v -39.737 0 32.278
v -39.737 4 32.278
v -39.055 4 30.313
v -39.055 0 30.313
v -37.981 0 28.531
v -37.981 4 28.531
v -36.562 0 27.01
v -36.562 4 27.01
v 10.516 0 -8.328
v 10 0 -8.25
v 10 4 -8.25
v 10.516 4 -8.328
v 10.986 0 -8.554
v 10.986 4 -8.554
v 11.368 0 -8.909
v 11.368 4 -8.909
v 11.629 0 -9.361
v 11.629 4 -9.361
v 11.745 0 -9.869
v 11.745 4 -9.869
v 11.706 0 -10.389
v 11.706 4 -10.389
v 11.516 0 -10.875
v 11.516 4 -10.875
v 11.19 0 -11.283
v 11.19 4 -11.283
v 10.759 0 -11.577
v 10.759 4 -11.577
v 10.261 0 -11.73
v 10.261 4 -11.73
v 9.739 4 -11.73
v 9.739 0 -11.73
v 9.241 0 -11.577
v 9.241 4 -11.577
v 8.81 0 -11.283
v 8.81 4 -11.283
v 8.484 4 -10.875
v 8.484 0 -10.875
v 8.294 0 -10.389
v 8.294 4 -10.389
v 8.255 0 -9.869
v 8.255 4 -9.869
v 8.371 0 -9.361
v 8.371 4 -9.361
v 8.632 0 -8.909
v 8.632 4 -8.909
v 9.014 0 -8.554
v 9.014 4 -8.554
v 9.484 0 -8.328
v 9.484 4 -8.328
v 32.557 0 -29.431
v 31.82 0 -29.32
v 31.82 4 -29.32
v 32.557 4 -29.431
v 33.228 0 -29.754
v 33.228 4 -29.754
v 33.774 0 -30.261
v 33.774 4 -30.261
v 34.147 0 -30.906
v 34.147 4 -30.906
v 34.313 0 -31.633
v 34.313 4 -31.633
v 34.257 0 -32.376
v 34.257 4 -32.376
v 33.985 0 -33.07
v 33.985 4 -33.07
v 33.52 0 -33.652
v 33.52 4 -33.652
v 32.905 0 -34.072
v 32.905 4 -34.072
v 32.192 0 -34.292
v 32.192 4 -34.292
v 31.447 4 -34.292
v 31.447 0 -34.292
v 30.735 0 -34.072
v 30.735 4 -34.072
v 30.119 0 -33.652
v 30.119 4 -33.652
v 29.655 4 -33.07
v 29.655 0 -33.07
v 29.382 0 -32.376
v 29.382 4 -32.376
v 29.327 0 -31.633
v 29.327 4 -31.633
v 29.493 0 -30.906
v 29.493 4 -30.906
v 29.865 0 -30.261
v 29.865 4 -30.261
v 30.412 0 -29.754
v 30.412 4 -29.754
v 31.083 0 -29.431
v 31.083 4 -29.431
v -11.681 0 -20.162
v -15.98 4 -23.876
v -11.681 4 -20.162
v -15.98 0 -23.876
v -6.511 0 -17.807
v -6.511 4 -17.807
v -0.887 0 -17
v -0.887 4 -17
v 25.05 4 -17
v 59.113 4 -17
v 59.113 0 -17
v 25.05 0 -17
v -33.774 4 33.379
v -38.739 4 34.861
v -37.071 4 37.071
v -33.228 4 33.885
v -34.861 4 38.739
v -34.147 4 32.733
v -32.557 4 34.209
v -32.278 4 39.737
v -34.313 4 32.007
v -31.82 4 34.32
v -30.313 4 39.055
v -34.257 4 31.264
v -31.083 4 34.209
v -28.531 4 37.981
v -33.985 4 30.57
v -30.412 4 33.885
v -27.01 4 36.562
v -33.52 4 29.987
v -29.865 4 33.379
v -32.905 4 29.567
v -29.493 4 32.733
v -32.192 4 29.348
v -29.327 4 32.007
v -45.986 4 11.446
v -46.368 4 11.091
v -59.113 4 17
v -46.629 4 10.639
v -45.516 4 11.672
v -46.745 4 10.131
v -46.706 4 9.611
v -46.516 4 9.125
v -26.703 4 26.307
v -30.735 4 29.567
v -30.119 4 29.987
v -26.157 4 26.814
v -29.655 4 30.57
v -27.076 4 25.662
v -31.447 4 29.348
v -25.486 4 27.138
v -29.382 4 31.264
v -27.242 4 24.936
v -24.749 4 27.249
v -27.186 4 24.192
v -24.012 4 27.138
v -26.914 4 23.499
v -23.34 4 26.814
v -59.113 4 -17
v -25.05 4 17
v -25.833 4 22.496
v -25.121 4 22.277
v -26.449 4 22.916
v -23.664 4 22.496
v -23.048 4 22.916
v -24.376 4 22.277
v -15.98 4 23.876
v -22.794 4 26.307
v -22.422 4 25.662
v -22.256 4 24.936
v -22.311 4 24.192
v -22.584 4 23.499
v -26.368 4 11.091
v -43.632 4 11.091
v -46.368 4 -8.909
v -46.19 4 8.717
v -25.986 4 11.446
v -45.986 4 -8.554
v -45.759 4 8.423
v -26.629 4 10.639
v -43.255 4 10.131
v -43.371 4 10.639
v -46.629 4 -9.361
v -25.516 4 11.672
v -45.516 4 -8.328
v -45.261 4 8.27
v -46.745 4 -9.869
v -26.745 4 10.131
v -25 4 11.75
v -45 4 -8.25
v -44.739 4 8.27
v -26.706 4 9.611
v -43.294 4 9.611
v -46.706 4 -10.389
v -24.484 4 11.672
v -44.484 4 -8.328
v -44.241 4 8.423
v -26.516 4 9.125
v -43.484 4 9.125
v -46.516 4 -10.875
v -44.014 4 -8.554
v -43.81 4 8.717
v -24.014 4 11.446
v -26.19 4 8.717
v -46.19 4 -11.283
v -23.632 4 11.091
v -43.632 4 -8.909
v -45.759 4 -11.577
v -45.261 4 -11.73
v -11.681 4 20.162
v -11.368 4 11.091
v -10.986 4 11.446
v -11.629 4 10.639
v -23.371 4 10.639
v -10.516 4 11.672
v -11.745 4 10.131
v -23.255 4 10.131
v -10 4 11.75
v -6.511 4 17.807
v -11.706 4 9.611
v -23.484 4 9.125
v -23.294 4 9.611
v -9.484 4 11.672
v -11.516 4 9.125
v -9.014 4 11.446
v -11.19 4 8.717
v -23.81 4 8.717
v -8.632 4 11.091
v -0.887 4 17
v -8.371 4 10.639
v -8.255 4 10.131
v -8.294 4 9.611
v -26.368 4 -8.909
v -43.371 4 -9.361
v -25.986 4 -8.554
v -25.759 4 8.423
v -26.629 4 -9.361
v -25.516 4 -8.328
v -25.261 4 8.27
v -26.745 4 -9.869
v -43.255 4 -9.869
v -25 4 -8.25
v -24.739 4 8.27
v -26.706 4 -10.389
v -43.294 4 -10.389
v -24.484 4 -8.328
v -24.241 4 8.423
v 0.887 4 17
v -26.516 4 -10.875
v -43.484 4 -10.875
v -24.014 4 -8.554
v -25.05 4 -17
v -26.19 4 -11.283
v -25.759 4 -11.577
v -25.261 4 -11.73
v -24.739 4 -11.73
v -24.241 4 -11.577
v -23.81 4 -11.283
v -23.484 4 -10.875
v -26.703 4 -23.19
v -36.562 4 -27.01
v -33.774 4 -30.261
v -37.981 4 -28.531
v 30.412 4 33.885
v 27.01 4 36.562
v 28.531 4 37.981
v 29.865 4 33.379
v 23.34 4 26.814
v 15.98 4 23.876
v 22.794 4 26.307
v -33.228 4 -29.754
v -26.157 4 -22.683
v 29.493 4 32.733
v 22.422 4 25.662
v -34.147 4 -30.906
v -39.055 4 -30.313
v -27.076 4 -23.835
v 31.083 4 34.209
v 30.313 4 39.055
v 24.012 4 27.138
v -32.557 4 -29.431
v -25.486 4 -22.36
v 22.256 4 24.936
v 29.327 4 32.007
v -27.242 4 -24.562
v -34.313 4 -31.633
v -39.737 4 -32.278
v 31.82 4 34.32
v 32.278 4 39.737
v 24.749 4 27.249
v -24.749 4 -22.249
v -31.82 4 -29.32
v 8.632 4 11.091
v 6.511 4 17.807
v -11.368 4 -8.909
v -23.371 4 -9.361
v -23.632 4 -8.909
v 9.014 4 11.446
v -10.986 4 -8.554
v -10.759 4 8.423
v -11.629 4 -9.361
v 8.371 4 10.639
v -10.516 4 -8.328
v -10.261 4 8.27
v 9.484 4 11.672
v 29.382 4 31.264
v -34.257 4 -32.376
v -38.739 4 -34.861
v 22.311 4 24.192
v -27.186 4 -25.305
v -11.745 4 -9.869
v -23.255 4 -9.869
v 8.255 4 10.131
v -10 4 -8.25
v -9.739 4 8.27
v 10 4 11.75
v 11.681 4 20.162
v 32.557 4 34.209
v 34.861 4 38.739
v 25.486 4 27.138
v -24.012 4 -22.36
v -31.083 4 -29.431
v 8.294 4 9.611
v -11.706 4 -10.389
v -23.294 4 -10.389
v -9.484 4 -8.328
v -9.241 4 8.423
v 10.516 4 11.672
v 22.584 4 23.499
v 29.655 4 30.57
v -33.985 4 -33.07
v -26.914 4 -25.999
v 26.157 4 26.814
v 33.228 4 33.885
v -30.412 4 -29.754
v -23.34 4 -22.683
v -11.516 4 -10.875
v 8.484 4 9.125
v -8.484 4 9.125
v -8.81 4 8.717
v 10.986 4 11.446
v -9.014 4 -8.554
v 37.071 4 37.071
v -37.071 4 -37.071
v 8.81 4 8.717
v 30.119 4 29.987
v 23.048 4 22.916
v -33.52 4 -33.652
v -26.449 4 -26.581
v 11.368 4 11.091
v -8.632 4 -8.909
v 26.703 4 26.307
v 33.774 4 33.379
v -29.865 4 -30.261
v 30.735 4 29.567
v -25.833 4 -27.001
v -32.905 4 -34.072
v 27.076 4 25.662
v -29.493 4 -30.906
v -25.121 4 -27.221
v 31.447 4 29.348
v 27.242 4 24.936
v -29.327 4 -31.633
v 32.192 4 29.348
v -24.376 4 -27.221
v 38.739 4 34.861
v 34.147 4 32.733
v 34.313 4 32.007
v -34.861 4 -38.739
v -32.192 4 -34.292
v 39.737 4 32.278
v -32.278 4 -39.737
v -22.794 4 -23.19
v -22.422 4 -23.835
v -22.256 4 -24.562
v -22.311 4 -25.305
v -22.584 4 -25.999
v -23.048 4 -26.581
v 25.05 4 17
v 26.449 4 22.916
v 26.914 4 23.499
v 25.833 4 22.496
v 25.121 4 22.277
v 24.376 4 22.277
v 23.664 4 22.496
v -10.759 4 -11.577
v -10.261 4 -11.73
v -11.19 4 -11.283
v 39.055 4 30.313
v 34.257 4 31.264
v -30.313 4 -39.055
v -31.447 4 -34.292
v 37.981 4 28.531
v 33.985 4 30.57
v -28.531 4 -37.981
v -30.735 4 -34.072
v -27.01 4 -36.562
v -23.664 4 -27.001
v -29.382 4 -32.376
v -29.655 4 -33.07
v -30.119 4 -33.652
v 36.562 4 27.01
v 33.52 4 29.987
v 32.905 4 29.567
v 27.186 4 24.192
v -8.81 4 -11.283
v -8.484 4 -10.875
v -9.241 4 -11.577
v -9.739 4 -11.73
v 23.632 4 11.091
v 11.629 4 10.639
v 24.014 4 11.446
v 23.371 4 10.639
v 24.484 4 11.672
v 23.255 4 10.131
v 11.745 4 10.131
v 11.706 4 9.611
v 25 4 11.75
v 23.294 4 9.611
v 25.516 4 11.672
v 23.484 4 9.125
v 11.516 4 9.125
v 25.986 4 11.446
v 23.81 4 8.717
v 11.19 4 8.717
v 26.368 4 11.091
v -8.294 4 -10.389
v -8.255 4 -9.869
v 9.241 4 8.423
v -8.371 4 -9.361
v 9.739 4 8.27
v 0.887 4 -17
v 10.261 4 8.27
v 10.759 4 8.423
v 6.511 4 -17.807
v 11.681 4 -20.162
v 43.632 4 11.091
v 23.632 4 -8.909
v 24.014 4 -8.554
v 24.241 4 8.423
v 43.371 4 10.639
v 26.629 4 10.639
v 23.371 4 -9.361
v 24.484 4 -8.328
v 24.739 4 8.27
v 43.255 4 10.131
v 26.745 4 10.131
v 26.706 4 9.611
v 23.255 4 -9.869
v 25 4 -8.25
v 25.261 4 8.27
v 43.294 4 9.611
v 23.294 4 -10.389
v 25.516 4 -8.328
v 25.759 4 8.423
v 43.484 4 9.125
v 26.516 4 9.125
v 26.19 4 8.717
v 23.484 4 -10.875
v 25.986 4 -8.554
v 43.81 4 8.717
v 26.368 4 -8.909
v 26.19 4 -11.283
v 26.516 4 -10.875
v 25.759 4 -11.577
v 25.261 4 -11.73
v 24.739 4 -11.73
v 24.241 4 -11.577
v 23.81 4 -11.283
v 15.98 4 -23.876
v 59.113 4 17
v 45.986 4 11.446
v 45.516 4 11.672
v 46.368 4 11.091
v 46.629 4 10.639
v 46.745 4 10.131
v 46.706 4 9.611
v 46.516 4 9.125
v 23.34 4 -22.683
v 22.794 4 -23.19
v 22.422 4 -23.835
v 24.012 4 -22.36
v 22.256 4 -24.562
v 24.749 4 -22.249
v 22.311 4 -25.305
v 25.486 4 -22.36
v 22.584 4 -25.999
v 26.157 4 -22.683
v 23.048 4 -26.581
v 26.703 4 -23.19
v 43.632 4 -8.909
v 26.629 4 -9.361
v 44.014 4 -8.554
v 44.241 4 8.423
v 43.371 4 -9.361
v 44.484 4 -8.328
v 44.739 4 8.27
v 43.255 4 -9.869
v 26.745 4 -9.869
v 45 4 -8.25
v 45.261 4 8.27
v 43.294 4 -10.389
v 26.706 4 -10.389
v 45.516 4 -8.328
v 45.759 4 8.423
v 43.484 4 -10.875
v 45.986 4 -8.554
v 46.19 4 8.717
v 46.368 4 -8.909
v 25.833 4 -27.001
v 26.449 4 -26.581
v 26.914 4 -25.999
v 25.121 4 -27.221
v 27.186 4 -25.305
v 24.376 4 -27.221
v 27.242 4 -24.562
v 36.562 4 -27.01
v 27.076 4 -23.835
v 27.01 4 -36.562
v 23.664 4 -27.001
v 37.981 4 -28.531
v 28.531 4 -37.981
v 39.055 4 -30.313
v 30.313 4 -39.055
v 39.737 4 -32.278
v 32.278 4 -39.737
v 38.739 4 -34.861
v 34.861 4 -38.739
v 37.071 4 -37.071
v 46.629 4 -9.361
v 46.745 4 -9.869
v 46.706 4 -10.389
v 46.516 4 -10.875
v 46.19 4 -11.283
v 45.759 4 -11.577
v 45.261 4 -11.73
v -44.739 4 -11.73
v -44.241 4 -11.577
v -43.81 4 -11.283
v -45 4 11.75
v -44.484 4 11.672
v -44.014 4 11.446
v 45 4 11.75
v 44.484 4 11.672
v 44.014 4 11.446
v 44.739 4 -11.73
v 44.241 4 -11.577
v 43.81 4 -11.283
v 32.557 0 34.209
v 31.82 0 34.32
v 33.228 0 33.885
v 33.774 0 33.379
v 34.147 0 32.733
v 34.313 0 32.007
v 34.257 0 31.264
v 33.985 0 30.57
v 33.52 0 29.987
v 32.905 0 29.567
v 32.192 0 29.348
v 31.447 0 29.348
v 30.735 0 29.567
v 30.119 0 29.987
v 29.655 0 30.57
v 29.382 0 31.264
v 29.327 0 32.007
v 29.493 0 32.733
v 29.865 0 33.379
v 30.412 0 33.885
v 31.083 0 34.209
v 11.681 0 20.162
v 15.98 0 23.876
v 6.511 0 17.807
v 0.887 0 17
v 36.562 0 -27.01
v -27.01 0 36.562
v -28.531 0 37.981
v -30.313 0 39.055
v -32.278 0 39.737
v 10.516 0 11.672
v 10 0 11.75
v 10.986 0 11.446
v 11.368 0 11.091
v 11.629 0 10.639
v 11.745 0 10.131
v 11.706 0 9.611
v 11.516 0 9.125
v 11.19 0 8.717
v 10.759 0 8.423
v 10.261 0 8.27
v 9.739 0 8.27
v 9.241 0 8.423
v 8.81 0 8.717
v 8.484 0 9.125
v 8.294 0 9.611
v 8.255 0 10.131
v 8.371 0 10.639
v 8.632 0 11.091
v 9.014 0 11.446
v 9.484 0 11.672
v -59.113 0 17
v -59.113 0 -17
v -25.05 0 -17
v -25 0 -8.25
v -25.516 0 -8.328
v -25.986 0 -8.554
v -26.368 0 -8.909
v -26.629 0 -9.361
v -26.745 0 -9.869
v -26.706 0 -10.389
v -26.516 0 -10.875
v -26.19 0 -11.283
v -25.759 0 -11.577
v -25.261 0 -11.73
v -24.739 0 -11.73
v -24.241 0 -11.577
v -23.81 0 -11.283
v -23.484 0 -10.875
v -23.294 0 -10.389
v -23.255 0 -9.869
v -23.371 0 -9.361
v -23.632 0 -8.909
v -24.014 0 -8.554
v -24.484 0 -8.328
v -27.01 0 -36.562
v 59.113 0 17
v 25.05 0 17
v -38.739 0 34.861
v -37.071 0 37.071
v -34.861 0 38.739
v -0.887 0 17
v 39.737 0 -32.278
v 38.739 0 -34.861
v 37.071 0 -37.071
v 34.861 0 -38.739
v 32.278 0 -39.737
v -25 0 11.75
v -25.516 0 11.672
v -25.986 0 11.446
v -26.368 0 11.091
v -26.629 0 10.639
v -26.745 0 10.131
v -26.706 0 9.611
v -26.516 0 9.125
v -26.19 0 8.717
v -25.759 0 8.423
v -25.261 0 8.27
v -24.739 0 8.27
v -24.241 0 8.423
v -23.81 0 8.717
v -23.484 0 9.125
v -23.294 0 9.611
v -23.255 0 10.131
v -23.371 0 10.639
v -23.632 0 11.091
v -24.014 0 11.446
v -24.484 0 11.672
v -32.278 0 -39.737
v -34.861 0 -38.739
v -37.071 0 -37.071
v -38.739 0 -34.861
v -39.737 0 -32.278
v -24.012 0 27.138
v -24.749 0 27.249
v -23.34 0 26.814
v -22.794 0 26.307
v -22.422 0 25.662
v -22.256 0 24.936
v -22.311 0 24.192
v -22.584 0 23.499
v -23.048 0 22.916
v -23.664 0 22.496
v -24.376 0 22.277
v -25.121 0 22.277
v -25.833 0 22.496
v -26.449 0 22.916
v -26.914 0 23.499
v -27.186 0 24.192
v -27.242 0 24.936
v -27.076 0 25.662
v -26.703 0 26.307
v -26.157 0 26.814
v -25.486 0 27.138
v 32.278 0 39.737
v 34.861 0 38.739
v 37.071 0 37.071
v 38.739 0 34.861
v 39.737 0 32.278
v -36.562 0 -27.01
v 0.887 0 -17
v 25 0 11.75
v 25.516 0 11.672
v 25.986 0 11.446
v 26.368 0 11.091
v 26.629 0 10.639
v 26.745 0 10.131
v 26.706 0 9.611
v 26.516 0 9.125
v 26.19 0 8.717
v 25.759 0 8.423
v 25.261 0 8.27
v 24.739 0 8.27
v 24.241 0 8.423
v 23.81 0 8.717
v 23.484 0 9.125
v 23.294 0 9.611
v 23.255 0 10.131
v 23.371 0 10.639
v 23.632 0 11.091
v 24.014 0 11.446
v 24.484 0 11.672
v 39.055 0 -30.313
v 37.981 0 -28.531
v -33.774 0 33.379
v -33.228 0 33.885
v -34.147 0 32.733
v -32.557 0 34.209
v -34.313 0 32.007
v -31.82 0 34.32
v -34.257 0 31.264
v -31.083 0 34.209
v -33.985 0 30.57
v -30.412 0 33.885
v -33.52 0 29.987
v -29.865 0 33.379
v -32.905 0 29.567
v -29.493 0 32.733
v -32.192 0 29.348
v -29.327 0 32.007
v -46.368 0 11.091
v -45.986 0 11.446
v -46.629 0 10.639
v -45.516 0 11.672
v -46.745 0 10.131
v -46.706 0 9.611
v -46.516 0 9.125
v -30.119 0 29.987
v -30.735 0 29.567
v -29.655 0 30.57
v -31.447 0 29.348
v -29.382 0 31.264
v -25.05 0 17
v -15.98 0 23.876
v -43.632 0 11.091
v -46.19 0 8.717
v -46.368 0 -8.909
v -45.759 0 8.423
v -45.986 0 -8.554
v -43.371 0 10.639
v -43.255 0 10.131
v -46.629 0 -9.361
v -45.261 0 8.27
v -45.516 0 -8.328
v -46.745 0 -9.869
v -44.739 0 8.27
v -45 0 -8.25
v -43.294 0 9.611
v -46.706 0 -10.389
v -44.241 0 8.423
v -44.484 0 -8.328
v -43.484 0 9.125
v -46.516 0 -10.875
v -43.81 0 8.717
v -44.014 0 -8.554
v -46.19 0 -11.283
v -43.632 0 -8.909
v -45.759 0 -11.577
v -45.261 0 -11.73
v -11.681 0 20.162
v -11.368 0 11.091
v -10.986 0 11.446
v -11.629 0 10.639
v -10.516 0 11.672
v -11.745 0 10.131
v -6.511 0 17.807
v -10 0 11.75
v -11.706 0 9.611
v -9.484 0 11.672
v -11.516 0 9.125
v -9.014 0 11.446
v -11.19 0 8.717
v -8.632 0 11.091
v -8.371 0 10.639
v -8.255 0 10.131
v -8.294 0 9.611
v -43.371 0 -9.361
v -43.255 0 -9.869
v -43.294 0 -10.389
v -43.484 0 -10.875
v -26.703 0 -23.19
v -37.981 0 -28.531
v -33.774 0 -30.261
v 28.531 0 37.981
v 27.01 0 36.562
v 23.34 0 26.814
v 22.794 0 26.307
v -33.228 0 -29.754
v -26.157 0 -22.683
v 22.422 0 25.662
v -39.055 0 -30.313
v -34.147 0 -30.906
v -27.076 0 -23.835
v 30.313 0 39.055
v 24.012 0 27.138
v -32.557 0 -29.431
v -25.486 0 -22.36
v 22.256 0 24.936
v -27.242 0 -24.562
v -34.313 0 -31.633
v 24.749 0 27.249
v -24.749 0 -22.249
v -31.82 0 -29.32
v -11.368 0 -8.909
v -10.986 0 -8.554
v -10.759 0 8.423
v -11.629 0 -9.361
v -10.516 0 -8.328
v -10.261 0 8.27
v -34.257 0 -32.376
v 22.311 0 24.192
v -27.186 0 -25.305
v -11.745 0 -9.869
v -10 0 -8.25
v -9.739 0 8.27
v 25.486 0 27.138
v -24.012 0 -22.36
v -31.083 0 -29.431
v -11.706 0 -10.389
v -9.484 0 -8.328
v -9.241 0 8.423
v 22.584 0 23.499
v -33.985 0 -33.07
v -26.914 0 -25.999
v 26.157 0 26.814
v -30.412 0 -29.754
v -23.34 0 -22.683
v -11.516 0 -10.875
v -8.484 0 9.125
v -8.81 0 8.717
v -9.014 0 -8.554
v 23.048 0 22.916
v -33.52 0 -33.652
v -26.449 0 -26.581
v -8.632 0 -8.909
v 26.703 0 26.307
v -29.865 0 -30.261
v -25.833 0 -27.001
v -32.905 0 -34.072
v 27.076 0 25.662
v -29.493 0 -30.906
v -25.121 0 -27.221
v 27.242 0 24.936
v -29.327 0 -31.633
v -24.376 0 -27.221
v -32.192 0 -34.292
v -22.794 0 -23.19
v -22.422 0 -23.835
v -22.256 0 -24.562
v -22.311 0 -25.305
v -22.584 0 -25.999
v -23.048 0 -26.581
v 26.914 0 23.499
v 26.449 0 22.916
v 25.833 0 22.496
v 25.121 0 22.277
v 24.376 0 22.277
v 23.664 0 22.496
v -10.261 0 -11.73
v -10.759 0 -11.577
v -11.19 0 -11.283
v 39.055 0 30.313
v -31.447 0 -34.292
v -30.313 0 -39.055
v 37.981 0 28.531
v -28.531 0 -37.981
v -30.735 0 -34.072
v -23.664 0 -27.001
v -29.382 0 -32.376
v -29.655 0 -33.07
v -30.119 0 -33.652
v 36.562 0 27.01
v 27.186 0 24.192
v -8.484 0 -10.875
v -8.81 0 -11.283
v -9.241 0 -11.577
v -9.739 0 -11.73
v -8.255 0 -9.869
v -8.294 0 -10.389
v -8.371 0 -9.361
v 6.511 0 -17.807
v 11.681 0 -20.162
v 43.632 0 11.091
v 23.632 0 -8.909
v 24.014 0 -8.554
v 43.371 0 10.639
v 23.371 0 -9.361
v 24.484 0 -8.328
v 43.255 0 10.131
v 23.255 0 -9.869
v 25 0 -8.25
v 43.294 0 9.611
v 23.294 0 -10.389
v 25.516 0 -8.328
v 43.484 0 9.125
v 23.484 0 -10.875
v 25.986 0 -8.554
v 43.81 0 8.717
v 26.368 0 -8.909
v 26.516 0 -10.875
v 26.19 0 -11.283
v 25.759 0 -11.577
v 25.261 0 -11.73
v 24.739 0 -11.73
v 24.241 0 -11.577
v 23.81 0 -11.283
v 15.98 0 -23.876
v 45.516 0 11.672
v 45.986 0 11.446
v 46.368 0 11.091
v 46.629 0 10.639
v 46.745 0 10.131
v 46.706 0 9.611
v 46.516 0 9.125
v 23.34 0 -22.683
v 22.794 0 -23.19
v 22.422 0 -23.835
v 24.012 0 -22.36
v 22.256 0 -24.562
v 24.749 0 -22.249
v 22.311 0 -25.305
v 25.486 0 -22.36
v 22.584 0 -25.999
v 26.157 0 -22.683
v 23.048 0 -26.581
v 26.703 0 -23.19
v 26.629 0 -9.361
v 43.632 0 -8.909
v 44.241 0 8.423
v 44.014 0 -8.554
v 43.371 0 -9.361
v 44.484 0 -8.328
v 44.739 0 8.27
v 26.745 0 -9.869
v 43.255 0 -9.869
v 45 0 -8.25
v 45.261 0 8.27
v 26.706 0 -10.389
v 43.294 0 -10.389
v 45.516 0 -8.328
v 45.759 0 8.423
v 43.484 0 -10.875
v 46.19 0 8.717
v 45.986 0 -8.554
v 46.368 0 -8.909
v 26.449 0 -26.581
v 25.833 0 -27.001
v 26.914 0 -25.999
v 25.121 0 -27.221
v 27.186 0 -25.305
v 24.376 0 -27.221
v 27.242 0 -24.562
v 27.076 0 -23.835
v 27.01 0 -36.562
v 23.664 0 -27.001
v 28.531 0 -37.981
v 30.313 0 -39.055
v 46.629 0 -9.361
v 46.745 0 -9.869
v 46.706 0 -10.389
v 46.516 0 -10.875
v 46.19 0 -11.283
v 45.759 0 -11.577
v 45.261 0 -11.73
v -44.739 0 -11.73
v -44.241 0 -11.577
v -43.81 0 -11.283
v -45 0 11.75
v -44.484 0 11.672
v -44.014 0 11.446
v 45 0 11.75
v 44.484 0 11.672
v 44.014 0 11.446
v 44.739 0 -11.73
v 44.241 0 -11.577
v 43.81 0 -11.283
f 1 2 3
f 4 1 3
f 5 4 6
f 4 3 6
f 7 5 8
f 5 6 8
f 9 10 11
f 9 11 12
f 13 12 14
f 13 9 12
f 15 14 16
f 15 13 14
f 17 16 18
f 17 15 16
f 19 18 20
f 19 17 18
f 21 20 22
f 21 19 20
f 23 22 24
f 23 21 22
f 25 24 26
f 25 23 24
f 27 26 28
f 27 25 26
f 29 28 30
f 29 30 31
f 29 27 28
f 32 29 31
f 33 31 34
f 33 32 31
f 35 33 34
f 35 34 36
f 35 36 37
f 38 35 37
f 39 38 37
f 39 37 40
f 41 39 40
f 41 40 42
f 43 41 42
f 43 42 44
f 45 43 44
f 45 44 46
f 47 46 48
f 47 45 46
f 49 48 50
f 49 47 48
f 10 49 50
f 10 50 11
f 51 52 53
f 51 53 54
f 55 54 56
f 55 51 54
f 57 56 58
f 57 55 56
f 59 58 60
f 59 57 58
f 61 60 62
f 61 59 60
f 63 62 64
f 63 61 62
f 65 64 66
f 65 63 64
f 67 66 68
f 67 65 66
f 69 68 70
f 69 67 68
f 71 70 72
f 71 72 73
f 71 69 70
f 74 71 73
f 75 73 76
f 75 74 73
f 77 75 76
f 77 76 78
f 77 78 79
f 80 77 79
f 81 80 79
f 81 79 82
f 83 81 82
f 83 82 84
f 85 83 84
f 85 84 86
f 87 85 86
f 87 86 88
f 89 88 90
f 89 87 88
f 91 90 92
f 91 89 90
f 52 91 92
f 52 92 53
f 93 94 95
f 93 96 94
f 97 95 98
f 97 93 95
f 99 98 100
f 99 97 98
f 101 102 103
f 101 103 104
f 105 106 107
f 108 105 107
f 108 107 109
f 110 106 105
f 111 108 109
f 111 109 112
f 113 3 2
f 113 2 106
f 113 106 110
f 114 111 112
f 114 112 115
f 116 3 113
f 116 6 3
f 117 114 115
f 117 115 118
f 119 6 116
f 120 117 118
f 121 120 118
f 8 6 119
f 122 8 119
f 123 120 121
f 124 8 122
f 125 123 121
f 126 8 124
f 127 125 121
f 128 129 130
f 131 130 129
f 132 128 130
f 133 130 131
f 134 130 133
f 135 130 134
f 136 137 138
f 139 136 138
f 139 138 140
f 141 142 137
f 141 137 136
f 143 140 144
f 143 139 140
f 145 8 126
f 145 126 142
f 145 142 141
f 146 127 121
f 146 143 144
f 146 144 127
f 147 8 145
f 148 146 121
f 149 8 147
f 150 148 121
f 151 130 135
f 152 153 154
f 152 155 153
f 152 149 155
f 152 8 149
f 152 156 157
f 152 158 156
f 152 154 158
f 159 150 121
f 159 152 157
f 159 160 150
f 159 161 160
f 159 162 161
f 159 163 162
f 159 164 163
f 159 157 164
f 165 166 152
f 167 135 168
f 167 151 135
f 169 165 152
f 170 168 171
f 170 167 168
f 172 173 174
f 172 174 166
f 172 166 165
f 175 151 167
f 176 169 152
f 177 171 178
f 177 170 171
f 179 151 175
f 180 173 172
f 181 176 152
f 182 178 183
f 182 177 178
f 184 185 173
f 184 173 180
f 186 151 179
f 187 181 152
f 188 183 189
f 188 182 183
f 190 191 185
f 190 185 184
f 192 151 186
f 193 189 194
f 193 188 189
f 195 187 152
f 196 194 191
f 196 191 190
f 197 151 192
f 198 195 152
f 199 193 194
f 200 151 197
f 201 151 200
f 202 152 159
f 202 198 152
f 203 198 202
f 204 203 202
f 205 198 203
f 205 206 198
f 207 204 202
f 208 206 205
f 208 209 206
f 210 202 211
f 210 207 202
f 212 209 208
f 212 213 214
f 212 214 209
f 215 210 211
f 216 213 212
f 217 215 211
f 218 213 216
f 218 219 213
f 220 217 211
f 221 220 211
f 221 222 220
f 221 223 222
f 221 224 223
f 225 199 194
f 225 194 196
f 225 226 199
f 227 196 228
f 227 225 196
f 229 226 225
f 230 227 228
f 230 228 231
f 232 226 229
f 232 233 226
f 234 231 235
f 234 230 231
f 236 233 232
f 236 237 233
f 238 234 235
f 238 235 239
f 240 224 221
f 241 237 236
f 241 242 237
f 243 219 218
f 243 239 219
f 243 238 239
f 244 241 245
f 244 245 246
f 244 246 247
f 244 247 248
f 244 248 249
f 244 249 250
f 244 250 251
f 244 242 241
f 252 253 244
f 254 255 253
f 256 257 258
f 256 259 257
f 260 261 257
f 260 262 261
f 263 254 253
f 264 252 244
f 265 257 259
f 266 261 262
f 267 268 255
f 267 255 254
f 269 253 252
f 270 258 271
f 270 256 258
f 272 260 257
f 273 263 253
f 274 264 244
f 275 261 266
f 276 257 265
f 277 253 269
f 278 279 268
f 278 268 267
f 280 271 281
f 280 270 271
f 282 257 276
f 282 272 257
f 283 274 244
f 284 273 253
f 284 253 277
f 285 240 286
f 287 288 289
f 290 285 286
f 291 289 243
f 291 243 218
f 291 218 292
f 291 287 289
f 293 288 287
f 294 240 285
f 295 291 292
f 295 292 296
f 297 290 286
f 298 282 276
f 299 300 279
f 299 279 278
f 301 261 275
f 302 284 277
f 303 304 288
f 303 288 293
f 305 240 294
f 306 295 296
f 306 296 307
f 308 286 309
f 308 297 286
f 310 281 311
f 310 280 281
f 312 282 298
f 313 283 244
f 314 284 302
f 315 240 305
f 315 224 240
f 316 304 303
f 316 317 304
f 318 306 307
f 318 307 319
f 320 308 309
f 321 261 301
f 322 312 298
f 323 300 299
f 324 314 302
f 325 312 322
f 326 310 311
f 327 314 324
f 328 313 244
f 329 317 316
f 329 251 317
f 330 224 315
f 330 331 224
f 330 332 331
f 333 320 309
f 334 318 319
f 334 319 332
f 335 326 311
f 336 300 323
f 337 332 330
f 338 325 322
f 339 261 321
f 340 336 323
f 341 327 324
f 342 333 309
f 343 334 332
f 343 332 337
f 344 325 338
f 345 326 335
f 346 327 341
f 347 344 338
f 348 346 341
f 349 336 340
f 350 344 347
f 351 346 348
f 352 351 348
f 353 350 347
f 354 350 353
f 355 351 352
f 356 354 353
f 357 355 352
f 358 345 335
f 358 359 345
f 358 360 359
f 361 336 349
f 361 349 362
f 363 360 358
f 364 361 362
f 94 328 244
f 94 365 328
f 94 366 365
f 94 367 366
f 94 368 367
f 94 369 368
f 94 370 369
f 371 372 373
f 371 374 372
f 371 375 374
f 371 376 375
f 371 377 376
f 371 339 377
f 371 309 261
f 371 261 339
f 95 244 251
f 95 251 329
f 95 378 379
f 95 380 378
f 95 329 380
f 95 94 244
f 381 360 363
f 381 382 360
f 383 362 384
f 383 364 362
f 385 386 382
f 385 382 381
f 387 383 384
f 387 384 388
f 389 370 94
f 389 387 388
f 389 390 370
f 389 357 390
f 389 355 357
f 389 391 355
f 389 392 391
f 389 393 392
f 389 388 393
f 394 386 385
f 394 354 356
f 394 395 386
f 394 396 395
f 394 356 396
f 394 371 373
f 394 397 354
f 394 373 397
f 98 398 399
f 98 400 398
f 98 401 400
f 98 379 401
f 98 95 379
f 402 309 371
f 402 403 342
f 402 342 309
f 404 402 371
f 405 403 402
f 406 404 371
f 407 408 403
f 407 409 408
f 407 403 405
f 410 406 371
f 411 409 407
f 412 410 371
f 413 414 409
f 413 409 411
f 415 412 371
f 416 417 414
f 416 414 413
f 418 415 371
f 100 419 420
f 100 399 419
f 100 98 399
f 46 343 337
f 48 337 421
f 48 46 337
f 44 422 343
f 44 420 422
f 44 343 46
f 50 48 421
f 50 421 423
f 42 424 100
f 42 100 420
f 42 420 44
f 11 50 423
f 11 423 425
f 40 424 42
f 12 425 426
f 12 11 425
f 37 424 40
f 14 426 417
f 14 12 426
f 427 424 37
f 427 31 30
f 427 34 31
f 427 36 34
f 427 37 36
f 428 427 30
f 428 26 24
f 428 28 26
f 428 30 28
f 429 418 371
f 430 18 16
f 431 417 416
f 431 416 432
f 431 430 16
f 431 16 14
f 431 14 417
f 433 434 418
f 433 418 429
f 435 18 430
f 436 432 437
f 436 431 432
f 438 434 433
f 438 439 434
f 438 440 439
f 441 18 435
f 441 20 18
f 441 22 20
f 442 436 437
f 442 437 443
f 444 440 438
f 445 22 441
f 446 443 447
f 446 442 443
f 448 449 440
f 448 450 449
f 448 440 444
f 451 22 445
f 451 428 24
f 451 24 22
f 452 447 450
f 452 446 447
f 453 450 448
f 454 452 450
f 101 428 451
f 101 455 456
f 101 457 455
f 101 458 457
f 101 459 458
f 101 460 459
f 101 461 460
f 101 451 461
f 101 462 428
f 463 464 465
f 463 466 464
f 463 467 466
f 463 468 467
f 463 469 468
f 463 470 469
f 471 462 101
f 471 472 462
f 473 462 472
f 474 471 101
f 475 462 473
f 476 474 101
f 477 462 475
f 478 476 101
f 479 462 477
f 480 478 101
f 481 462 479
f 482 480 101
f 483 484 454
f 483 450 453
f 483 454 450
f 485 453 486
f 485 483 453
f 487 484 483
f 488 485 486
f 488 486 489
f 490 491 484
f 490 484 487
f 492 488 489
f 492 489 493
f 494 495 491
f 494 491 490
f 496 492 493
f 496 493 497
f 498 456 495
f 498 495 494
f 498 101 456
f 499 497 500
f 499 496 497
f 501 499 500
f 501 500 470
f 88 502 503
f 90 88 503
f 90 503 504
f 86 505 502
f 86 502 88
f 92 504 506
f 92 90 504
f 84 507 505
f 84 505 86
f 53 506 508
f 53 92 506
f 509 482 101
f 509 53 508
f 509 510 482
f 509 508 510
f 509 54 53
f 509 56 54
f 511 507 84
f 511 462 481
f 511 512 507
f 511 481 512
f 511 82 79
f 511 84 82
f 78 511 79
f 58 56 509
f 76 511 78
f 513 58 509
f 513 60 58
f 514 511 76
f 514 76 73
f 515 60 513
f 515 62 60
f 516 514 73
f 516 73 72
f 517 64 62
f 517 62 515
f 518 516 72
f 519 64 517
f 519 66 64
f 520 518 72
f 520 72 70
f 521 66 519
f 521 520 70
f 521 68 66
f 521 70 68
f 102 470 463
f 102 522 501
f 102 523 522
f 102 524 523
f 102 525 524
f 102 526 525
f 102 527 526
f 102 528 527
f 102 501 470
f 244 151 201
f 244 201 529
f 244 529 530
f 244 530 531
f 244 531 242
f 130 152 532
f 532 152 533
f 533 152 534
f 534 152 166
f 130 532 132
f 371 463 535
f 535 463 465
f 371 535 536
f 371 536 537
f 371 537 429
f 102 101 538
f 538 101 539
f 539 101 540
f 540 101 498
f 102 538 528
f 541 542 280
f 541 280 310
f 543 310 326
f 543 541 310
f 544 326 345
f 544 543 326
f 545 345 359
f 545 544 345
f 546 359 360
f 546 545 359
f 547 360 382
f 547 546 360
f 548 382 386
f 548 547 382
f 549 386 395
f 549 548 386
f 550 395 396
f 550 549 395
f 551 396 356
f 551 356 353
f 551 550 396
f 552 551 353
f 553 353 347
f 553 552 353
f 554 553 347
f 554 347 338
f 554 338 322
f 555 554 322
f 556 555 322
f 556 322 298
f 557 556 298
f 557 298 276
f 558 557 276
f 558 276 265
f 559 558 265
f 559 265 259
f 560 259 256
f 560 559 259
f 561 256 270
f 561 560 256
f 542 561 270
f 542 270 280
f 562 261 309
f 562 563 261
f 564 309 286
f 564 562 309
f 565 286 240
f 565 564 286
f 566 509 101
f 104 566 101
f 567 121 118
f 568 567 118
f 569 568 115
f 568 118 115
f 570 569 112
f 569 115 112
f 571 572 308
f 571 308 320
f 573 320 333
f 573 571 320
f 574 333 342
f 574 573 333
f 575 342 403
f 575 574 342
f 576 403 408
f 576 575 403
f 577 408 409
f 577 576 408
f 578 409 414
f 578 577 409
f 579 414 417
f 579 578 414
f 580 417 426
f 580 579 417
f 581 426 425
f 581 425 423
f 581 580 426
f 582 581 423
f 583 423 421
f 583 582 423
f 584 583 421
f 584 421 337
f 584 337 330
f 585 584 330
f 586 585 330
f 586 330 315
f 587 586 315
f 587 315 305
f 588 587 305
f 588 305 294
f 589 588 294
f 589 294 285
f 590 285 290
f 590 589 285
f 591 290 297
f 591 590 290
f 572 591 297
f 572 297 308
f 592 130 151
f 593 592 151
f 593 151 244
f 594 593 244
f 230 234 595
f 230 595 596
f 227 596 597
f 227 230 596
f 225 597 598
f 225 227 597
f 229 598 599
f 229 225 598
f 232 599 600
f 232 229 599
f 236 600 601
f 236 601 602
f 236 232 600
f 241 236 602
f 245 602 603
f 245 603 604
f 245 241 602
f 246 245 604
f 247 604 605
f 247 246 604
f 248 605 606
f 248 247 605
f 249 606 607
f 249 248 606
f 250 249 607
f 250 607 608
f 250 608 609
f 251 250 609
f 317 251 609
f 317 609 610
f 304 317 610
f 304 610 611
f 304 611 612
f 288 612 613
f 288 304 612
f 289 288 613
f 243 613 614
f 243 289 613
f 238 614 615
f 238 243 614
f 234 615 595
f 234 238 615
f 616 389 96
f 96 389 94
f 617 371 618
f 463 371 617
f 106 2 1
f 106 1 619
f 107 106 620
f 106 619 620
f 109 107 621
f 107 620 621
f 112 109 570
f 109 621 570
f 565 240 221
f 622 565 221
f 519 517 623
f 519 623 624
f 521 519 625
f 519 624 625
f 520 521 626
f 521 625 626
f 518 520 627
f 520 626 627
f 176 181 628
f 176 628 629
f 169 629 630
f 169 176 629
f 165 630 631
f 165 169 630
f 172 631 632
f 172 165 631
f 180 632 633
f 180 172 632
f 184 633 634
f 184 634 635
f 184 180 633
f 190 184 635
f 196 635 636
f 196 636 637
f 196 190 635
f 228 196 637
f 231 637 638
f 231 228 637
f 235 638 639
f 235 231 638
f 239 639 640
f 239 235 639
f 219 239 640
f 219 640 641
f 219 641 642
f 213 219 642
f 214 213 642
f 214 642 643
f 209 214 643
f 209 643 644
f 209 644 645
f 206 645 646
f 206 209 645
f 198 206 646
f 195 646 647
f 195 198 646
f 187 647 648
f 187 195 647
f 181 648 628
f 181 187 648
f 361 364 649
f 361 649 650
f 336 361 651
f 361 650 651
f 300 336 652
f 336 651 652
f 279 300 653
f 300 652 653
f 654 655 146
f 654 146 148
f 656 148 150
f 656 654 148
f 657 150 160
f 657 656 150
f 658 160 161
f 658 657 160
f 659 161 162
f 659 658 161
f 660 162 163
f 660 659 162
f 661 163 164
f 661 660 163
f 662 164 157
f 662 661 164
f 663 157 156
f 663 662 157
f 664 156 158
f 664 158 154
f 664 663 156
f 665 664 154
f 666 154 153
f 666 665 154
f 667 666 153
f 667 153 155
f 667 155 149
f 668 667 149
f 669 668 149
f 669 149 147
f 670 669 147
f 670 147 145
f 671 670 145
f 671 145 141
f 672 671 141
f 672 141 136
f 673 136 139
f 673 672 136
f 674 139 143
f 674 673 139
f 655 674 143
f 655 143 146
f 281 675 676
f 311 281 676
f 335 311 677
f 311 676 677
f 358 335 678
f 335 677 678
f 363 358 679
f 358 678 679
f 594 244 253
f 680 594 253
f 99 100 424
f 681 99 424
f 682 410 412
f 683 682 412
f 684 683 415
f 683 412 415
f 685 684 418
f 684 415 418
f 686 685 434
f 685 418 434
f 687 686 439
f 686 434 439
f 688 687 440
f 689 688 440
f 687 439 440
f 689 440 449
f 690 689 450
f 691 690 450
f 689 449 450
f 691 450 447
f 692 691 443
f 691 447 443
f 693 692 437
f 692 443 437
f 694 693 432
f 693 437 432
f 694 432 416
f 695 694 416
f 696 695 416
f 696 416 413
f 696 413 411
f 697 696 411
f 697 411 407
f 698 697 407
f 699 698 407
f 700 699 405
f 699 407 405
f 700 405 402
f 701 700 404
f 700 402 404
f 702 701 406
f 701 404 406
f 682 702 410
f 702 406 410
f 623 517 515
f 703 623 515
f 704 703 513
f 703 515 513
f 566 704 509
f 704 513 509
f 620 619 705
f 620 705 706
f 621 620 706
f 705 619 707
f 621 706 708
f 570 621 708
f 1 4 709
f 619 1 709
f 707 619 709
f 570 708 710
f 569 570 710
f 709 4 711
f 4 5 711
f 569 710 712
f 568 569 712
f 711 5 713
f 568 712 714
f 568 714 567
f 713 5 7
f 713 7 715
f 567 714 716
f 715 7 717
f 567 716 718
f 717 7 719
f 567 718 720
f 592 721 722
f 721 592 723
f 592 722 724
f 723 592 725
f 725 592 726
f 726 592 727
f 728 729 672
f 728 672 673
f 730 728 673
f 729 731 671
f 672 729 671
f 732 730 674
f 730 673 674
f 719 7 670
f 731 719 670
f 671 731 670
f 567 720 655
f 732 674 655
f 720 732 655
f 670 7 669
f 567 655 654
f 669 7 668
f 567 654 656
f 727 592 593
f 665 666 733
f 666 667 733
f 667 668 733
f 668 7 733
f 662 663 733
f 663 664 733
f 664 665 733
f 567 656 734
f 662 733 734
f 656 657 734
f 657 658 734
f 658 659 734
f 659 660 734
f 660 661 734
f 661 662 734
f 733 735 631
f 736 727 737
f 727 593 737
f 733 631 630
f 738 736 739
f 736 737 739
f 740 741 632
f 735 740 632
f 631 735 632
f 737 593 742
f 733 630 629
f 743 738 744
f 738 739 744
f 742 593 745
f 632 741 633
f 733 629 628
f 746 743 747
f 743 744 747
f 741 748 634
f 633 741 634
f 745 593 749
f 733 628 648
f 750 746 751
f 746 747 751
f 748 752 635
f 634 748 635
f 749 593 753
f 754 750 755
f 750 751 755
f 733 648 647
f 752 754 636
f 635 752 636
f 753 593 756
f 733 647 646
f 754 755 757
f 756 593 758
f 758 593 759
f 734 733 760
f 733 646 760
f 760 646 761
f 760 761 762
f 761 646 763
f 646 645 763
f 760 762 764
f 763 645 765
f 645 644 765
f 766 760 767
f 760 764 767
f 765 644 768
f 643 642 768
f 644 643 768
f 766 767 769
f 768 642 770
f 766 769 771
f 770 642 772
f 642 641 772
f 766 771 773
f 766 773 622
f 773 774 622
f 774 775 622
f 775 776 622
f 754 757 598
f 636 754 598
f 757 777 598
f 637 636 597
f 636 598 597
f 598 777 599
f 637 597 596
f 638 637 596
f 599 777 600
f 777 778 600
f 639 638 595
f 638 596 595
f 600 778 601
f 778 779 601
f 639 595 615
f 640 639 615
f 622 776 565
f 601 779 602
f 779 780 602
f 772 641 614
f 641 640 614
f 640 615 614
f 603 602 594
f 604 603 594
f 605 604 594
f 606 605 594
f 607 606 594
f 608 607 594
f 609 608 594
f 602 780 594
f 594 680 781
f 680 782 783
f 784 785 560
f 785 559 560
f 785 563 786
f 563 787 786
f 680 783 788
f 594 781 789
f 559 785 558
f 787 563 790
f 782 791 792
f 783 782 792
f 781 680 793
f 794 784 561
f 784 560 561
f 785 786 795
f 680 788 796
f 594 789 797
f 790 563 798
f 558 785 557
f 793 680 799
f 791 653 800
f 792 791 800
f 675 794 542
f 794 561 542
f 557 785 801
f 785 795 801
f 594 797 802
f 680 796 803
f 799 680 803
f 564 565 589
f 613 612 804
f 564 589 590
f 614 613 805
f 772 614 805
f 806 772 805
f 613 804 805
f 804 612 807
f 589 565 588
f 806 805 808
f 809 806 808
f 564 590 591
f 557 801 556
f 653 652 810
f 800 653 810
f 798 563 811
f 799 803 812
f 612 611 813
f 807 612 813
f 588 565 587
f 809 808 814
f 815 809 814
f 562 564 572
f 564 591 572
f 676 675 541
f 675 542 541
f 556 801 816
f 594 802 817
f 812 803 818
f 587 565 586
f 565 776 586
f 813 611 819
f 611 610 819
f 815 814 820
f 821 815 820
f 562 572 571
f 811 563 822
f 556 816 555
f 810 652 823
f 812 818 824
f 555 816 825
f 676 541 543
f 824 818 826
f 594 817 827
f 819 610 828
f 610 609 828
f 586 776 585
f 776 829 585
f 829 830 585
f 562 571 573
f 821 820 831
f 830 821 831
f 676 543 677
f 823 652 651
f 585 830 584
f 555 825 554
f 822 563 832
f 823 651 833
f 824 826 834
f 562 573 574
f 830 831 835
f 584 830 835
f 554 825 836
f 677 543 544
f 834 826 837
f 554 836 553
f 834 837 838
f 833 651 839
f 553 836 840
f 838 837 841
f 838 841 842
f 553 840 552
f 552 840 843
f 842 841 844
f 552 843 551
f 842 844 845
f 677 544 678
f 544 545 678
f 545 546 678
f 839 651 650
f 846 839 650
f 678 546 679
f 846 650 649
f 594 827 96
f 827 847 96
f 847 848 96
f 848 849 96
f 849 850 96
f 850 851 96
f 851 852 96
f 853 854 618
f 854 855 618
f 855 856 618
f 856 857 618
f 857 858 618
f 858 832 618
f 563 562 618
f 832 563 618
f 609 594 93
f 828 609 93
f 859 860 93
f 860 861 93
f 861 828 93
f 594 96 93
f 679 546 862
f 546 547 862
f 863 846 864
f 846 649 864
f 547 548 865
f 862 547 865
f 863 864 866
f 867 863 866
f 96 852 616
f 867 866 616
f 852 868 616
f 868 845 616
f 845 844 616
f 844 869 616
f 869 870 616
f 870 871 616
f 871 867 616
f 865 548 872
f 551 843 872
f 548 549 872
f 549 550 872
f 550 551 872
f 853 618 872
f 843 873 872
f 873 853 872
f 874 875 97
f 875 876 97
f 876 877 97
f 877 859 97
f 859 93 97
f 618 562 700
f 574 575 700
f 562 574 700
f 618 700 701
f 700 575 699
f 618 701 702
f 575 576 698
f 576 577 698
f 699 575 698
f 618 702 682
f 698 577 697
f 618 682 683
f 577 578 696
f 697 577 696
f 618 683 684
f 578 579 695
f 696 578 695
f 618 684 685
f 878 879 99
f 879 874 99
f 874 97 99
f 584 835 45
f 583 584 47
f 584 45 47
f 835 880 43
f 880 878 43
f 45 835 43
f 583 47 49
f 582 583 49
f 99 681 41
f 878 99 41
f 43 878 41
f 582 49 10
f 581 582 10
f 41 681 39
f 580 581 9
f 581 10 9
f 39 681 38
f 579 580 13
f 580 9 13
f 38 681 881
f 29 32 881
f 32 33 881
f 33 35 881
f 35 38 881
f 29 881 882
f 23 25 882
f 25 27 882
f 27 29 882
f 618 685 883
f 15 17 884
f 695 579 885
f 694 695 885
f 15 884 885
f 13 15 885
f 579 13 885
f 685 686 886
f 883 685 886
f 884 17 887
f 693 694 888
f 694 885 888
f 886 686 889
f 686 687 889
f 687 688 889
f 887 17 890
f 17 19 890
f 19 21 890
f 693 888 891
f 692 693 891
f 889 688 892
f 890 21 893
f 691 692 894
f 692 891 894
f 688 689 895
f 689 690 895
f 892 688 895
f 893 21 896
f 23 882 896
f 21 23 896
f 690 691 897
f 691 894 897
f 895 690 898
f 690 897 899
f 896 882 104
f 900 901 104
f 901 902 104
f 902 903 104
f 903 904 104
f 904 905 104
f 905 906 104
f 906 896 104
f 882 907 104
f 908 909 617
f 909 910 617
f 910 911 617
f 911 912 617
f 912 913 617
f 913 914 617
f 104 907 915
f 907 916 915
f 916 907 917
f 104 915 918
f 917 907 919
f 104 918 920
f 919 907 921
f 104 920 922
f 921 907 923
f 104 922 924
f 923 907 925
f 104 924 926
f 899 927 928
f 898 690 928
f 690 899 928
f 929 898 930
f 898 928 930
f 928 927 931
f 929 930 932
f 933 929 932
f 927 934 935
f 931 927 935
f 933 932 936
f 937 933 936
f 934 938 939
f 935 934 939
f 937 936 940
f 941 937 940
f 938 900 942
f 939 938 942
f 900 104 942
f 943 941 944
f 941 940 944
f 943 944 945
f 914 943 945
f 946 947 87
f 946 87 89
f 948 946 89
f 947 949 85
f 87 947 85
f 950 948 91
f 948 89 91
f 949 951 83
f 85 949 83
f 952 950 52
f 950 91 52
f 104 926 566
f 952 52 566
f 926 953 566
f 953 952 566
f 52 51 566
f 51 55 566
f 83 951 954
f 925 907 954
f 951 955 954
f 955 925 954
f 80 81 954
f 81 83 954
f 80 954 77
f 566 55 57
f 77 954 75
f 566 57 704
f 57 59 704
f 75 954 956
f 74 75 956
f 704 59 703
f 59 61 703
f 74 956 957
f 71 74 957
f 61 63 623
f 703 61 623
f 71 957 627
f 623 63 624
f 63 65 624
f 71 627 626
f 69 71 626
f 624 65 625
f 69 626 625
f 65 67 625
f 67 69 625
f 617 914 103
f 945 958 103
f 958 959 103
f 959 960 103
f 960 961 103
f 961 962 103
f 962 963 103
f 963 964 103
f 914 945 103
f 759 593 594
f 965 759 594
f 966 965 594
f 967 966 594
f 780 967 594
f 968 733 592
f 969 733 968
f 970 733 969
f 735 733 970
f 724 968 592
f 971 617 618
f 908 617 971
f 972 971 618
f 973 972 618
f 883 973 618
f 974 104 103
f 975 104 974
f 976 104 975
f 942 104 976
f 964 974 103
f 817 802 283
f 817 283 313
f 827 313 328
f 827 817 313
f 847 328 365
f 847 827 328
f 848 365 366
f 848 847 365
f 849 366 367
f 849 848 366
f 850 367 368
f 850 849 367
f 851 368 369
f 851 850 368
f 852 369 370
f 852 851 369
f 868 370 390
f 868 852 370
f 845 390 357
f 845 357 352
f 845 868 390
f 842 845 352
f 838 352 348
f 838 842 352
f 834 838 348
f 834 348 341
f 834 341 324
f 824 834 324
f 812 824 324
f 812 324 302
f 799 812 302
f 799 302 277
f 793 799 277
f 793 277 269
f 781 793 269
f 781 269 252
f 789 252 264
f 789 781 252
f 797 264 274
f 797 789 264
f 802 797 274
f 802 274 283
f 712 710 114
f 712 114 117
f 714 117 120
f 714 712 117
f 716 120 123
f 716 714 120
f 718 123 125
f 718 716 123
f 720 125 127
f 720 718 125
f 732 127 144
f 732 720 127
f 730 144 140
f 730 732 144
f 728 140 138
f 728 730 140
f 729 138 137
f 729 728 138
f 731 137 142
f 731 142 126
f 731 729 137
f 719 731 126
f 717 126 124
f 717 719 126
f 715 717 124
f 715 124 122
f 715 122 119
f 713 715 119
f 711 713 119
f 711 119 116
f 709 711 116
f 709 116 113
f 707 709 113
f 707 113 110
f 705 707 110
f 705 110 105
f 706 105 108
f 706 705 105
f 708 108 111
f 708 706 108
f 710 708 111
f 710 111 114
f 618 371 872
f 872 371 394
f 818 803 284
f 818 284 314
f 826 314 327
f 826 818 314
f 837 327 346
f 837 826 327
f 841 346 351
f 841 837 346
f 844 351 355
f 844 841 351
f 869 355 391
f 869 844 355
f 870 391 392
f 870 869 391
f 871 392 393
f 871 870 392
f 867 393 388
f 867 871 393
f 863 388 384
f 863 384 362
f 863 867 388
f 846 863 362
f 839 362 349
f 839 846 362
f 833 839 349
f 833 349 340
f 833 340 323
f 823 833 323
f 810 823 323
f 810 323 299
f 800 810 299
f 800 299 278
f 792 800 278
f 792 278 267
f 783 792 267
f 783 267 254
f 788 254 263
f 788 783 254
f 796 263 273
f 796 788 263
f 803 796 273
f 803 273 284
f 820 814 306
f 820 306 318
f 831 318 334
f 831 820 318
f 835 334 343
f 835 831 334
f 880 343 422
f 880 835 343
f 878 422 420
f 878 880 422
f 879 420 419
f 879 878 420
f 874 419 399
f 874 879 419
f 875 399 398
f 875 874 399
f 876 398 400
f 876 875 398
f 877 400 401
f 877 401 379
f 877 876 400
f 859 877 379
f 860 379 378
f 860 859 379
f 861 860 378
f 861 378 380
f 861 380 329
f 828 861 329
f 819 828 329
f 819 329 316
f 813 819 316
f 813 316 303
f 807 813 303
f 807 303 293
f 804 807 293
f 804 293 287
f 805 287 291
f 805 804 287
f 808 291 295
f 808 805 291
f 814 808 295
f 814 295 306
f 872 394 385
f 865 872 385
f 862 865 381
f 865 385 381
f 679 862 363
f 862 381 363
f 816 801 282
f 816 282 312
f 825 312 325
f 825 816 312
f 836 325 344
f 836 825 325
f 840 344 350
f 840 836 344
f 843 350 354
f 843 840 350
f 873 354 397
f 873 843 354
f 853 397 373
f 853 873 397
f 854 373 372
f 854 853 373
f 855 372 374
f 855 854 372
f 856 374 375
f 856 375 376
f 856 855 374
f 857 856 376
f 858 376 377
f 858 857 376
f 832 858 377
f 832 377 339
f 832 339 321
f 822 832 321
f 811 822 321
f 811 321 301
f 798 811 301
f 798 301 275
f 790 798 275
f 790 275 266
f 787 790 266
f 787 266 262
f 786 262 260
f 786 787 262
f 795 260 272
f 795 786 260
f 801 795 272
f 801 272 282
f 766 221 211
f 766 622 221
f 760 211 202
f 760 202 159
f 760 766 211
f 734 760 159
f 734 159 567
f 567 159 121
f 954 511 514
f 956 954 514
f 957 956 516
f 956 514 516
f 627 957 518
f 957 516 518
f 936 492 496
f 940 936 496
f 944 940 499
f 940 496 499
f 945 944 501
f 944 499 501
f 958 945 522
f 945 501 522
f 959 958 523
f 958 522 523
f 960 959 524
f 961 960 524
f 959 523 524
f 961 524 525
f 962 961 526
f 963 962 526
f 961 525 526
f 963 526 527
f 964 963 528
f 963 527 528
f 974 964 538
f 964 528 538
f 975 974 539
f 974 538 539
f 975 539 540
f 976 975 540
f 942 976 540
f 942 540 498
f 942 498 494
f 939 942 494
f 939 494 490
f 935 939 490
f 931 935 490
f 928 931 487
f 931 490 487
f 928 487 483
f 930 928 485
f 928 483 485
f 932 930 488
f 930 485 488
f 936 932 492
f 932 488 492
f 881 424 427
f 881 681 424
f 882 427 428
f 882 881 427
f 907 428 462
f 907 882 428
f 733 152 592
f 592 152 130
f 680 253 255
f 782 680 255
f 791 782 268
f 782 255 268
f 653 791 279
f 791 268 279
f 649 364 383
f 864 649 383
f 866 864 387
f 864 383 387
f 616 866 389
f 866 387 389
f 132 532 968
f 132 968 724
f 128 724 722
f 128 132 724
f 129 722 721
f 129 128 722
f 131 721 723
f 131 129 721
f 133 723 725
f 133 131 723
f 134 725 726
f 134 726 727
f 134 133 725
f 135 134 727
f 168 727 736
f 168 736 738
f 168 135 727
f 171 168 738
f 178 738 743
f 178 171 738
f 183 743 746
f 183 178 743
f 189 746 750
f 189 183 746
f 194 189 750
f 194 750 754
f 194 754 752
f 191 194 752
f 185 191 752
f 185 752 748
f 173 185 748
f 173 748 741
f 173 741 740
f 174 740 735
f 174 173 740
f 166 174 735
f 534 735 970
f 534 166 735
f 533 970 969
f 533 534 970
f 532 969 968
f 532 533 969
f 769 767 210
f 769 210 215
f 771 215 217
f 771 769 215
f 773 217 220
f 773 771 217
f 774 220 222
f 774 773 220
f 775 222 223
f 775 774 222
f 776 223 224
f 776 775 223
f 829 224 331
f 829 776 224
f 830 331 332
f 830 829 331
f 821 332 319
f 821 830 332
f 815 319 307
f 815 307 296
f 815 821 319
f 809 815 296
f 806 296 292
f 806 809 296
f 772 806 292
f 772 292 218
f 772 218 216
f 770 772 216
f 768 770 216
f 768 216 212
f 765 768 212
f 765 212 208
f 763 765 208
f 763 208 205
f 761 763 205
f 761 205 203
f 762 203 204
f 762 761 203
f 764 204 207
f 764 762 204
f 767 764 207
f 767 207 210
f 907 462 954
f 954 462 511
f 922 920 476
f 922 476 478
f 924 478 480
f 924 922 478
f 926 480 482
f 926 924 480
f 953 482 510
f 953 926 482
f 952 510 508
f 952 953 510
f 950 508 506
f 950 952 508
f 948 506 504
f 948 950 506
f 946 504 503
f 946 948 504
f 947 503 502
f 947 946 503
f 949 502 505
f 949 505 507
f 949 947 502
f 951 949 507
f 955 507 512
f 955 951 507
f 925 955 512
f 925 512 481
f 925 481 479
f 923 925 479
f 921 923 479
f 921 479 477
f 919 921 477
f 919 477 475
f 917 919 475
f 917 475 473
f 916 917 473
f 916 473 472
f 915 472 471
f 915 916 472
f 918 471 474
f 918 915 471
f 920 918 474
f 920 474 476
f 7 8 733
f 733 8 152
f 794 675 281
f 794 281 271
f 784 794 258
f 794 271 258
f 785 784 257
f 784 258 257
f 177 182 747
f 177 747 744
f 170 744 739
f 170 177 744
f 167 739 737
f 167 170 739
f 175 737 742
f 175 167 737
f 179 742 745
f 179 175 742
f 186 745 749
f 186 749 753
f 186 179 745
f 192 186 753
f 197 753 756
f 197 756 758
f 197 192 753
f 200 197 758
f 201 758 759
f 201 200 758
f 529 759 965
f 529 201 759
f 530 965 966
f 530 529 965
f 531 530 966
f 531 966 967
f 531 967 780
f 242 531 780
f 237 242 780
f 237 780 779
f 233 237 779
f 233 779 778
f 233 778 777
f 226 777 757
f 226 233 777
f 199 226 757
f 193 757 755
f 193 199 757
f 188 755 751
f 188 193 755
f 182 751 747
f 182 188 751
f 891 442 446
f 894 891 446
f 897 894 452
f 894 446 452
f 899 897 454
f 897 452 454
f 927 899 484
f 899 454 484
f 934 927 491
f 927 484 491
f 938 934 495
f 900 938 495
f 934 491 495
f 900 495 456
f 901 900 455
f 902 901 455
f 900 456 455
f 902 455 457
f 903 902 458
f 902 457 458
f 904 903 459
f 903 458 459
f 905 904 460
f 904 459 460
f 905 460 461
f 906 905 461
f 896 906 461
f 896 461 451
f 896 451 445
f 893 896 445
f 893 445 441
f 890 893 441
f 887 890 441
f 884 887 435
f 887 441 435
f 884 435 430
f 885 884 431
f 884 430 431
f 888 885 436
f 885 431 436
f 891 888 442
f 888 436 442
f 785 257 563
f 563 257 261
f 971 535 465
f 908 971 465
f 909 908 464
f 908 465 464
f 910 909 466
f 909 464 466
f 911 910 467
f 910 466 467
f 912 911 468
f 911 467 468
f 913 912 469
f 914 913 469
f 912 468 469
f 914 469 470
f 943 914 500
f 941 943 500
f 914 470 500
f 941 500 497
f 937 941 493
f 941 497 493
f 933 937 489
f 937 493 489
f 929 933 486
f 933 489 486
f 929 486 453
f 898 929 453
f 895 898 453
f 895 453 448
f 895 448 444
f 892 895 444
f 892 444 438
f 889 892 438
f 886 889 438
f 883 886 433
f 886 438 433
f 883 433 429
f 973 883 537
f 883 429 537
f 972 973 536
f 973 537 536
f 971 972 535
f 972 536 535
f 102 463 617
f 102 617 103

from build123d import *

# Parameters (mm, degrees)
SKETCH1_W           = 80
SKETCH1_H           = 80
SKETCH1_R           = 2.5
SKETCH1_R_2         = 1.75
BOSS_EXTRUDE1_DEPTH = 4
CUT_EXTRUDE2_DEPTH  = 57.709787515
FILLET1_R           = 10
FILLET2_R           = 20
BOSS_EXTRUDE3_DEPTH = 4
SKETCH6_R           = 1.75
CUT_EXTRUDE3_DEPTH  = 4


with BuildPart() as part:
    # Sketch1 → Boss-Extrude1 (new body)
    with BuildSketch(Plane(origin=(0, 0, 0), x_dir=(1, 0, 0), z_dir=(0, 1, 0))):
        Rectangle(SKETCH1_W, SKETCH1_H)
        with Locations(Location((-24.748737342, 24.748737342, 0), (0, 0, 270))):
            Circle(SKETCH1_R, mode=Mode.SUBTRACT)
        with Locations(Location((24.748737342, 24.748737342, 0), (0, 0, 270))):
            Circle(SKETCH1_R, mode=Mode.SUBTRACT)
        with Locations(Location((24.748737342, -24.748737342, 0), (0, 0, 270))):
            Circle(SKETCH1_R, mode=Mode.SUBTRACT)
        with Locations(Location((-24.748737342, -24.748737342, 0), (0, 0, 270))):
            Circle(SKETCH1_R, mode=Mode.SUBTRACT)
        with Locations(Location((-10, 10, 0), (0, 0, 270))):
            Circle(SKETCH1_R_2, mode=Mode.SUBTRACT)
        with Locations(Location((10, 10, 0), (0, 0, 270))):
            Circle(SKETCH1_R_2, mode=Mode.SUBTRACT)
        with Locations(Location((10, -10, 0), (0, 0, 270))):
            Circle(SKETCH1_R_2, mode=Mode.SUBTRACT)
        with Locations(Location((-10, -10, 0), (0, 0, 270))):
            Circle(SKETCH1_R_2, mode=Mode.SUBTRACT)
        with Locations(Location((31.819805153, 31.819805153, 0), (0, 0, 270))):
            Circle(SKETCH1_R, mode=Mode.SUBTRACT)
        with Locations(Location((-31.819805153, 31.819805153, 0), (0, 0, 270))):
            Circle(SKETCH1_R, mode=Mode.SUBTRACT)
        with Locations(Location((-31.819805153, -31.819805153, 0), (0, 0, 270))):
            Circle(SKETCH1_R, mode=Mode.SUBTRACT)
        with Locations(Location((31.819805153, -31.819805153, 0), (0, 0, 270))):
            Circle(SKETCH1_R, mode=Mode.SUBTRACT)
    extrude(amount=BOSS_EXTRUDE1_DEPTH)

    # Sketch2 → Cut-Extrude2 (cut, through all)
    with BuildSketch(Plane(origin=(0, 4, 0), x_dir=(1, 0, 0), z_dir=(0, 1, 0))):
        Polygon((-40, 30), (-40, -30), (-17, -10), (-17, 10), align=None)
        Polygon((30, 40), (-30, 40), (-10, 17), (10, 17), align=None)
        Polygon((40, -30), (40, 30), (17, 10), (17, -10), align=None)
        Polygon((-30, -40), (30, -40), (10, -17), (-10, -17), align=None)
    extrude(amount=-CUT_EXTRUDE2_DEPTH, mode=Mode.SUBTRACT)

    # Fillet1
    # the kernel refuses this fillet: 10 mm, written as the material it takes off along each edge
    with BuildSketch(Plane(origin=(-30, 15.390762292, 40), x_dir=(-1, 0, 0), z_dir=(0, -1, 0)), Plane(origin=(-40, 15.390762292, 30), x_dir=(0.754605522163505, 0, -0.6561787149247863), z_dir=(0, -1, 0)), Plane(origin=(-40, 15.390762292, -30), x_dir=(0, 0, -1), z_dir=(0, -1, 0)), Plane(origin=(-30, 15.390762292, -40), x_dir=(0.6561787149247871, 0, 0.7546055221635043), z_dir=(0, -1, 0)), Plane(origin=(30, 15.390762292, -40), x_dir=(1, 0, 0), z_dir=(0, -1, 0)), Plane(origin=(40, 15.390762292, -30), x_dir=(-0.7546055221635045, 0, 0.6561787149247867), z_dir=(0, -1, 0)), Plane(origin=(40, 15.390762292, 30), x_dir=(0, 0, 1), z_dir=(0, -1, 0))) as fillet1_piece_1:
        with BuildLine():
            CenterArc((FILLET1_R * 0.455630491663, FILLET1_R), FILLET1_R, 221.009086902, 48.990913098)
            Line((-FILLET1_R * 0.2989750305, FILLET1_R * 0.343821285075), (0, 0))
            Line((0, 0), (FILLET1_R * 0.455630491663, 0))
        make_face()
    extrude(amount=26.781524583, mode=Mode.SUBTRACT)
    with BuildSketch(Plane(origin=(-40, -25, 40), x_dir=(0, 0, -1), z_dir=(0, 1, 0)), Plane(origin=(-40, -25, -40), x_dir=(1, 0, 0), z_dir=(0, 1, 0)), Plane(origin=(40, -25, -40), x_dir=(0, 0, 1), z_dir=(0, 1, 0)), Plane(origin=(40, -25, 40), x_dir=(-1, 0, 0), z_dir=(0, 1, 0))) as fillet1_piece_2:
        with BuildLine():
            CenterArc((FILLET1_R, -FILLET1_R), FILLET1_R, 90, 90)
            Line((0, -FILLET1_R), (0, 0))
            Line((0, 0), (FILLET1_R, 0))
        make_face()
    extrude(amount=54, mode=Mode.SUBTRACT)
    with BuildSketch(Plane(origin=(30, 15.390762292, 40), x_dir=(1, 0, 0), z_dir=(0, -1, 0))) as fillet1_piece_3:
        with BuildLine():
            CenterArc((FILLET1_R * 0.455630491663, -FILLET1_R), FILLET1_R, 90, 48.990913098)
            Line((-FILLET1_R * 0.2989750305, -FILLET1_R * 0.343821285075), (0, 0))
            Line((0, 0), (FILLET1_R * 0.455630491663, 0))
        make_face()
    extrude(amount=26.781524583, mode=Mode.SUBTRACT)

    # Fillet2
    fillet2_edges = [part.edges().sort_by_distance(p)[0] for p in [
        (10, 2, 17),
        (-10, 2, 17),
        (-17, 2, 10),
        (-17, 2, -10),
        (17, 2, -10),
        (17, 2, 10),
        (-10, 2, -17),
        (10, 2, -17),
    ]]
    fillet(fillet2_edges, radius=FILLET2_R)

    # Sketch5 → Boss-Extrude3 (add)
    with BuildSketch(Plane(origin=(0, 4, 0), x_dir=(1, 0, 0), z_dir=(0, 1, 0))):
        Polygon((-0.887390167, 17), (13.289046487, 12.123524967), (13.289046487, -13.496190448), (-0.887390167, -17), (59.112609833, -17), (59.112609833, 17), align=None)
    boss_extrude3 = extrude(amount=-BOSS_EXTRUDE3_DEPTH)

    # Sketch6 → Cut-Extrude3 (cut)
    with BuildSketch(Plane(origin=(0, 4, 0), x_dir=(1, 0, 0), z_dir=(0, 1, 0))):
        with Locations(Location((25, 10, 0), (0, 0, 270))):
            Circle(SKETCH6_R)
        with Locations(Location((45, 10, 0), (0, 0, 270))):
            Circle(SKETCH6_R)
        with Locations(Location((25, -10, 0), (0, 0, 270))):
            Circle(SKETCH6_R)
        with Locations(Location((45, -10, 0), (0, 0, 270))):
            Circle(SKETCH6_R)
    cut_extrude3 = extrude(amount=-CUT_EXTRUDE3_DEPTH, mode=Mode.SUBTRACT)

    # Mirror1: Boss-Extrude3, Cut-Extrude3 across plane
    add(boss_extrude3.mirror(Plane(origin=(0, 0, 0), x_dir=(0, 0, 1), z_dir=(1, 0, 0))))
    add(cut_extrude3.mirror(Plane(origin=(0, 0, 0), x_dir=(0, 0, 1), z_dir=(1, 0, 0))), mode=Mode.SUBTRACT)


solid = part.part
